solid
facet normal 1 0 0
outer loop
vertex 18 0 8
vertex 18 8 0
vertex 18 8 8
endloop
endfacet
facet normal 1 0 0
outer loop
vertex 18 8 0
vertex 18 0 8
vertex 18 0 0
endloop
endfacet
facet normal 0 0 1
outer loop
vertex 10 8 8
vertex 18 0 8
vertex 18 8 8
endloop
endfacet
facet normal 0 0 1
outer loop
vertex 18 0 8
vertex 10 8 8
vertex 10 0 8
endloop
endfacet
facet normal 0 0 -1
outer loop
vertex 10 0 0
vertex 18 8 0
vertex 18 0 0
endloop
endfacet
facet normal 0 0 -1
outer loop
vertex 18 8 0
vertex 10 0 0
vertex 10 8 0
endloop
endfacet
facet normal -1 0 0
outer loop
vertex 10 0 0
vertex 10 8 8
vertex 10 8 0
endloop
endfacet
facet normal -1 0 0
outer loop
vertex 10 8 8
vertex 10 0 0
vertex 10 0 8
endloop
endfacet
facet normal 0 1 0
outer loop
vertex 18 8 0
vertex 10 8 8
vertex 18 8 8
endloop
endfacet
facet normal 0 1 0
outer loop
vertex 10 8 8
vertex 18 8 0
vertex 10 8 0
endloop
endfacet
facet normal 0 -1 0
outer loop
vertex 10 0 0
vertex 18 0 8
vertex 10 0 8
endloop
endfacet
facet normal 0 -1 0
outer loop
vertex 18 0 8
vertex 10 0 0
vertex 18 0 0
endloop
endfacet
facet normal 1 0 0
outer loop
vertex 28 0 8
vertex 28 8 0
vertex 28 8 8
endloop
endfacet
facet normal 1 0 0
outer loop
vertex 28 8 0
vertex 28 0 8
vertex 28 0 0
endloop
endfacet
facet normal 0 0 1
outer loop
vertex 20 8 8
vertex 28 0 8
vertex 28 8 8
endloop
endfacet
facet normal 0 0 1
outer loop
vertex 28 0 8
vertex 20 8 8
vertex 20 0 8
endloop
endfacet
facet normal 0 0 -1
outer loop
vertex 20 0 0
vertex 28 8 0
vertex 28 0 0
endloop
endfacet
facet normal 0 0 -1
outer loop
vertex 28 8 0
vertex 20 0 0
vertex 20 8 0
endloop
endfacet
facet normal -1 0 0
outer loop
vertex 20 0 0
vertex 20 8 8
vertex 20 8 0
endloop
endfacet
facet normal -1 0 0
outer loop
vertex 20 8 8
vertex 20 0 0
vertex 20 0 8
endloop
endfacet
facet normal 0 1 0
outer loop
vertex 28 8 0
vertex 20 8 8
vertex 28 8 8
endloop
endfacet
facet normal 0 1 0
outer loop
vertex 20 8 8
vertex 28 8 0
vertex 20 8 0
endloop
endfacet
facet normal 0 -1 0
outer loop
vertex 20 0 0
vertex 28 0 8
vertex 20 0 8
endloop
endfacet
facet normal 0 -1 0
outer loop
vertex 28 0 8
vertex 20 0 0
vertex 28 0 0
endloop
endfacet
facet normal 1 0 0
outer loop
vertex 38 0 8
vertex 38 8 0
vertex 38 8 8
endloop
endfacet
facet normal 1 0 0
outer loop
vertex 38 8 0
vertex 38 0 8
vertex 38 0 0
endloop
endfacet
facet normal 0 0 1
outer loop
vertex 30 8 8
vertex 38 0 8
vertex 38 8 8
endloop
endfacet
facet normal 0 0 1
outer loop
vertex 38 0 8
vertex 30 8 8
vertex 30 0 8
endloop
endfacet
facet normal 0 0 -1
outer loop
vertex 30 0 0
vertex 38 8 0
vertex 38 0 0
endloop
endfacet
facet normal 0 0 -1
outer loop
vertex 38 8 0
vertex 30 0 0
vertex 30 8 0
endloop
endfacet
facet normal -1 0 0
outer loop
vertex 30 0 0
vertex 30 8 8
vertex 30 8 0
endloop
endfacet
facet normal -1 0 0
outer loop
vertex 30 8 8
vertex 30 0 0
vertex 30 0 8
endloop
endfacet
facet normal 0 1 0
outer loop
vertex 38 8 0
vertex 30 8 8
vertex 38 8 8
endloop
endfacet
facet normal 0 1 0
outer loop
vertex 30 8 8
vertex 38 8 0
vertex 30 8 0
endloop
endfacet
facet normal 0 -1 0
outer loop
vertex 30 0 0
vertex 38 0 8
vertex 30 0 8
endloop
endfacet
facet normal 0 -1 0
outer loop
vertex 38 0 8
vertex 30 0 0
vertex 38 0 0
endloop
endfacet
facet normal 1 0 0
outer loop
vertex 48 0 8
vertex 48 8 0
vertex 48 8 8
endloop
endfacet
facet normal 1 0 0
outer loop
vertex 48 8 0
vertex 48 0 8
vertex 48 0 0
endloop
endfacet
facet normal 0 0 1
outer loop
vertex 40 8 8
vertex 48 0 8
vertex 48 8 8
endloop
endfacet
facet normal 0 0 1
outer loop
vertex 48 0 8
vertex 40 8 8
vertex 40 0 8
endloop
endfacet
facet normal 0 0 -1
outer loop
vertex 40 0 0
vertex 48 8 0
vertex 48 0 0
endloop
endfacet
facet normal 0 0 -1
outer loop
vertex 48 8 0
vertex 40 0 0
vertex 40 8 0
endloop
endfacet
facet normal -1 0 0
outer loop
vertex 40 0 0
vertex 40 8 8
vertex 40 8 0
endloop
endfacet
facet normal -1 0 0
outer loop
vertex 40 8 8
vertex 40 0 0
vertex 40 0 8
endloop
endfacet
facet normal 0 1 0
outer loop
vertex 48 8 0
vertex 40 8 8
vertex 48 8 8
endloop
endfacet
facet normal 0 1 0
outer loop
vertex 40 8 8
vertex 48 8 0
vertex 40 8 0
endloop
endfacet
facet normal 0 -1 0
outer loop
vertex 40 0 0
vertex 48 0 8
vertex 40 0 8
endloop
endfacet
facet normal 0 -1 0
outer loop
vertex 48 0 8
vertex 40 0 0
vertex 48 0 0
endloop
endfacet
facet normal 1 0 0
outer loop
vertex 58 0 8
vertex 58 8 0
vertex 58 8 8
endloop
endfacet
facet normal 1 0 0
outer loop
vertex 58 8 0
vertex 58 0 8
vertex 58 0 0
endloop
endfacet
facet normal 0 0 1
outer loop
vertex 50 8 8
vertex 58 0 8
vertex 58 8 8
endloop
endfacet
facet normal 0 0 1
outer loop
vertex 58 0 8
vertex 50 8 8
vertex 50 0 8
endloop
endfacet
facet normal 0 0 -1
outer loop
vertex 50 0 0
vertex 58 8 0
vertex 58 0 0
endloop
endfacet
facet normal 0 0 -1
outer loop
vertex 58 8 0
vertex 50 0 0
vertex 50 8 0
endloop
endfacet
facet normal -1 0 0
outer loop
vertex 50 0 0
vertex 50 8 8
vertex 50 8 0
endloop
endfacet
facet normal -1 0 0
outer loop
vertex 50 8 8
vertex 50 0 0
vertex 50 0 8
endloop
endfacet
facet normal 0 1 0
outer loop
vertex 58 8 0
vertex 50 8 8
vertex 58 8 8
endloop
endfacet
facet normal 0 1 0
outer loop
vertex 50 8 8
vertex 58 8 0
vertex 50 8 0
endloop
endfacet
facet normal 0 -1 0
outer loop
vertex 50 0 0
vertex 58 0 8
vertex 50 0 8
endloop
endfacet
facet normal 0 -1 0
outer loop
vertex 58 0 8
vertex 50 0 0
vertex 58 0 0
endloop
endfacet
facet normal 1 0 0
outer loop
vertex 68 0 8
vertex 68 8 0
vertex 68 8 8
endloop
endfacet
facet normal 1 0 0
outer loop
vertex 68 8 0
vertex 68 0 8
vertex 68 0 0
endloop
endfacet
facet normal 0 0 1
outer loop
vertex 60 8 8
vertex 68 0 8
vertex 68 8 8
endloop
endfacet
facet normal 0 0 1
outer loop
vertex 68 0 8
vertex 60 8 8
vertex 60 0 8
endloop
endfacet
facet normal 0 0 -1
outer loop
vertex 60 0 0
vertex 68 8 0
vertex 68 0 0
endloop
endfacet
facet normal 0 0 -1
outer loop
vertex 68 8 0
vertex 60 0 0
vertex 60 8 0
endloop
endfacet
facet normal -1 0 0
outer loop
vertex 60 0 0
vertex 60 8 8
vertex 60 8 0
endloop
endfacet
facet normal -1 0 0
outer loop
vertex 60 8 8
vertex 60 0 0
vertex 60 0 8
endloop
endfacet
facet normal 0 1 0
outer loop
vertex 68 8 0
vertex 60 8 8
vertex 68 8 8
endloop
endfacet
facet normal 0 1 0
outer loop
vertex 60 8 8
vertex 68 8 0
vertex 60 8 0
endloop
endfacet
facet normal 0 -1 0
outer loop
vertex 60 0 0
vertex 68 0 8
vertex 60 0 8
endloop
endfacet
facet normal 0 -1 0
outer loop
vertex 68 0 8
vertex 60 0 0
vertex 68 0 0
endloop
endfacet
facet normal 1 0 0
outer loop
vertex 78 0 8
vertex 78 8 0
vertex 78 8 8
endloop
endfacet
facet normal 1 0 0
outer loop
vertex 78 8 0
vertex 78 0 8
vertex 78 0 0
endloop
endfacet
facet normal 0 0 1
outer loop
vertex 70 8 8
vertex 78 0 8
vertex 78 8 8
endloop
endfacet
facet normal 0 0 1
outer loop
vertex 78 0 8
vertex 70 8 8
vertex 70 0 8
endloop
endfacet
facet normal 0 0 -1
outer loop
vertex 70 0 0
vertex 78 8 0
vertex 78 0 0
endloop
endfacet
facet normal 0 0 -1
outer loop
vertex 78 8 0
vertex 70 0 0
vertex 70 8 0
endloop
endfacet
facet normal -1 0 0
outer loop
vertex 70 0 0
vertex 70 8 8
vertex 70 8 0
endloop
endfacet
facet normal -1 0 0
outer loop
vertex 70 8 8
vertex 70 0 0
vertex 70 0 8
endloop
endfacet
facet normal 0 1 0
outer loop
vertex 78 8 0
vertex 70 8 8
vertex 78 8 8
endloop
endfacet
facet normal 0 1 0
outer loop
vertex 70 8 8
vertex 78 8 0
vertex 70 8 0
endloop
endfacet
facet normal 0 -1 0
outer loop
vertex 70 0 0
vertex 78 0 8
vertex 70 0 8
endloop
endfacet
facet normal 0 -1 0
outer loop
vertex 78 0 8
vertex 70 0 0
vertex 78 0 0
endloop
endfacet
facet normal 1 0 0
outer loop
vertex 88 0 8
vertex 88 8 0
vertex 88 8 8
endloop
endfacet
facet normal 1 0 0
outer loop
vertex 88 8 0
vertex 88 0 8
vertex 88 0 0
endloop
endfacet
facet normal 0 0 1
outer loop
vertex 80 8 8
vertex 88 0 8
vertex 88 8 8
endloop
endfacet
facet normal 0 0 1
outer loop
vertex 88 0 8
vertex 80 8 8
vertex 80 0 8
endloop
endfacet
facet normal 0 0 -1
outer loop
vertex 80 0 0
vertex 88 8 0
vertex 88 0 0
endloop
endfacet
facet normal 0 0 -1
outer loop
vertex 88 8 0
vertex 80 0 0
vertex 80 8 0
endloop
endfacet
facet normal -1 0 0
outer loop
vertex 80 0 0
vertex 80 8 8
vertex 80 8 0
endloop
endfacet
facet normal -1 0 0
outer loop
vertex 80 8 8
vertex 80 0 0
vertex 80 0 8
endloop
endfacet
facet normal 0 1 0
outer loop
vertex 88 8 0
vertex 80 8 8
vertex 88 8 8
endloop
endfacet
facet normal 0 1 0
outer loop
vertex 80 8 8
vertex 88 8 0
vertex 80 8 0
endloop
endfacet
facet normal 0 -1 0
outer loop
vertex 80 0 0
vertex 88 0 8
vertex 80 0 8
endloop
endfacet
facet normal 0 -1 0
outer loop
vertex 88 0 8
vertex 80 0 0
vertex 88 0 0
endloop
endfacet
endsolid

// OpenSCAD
count = 8;
size = 8;

for (i=[1:count]) {
    translate([(i*size)+(i*2),0,0])
        cube([size, size, size]);
}
